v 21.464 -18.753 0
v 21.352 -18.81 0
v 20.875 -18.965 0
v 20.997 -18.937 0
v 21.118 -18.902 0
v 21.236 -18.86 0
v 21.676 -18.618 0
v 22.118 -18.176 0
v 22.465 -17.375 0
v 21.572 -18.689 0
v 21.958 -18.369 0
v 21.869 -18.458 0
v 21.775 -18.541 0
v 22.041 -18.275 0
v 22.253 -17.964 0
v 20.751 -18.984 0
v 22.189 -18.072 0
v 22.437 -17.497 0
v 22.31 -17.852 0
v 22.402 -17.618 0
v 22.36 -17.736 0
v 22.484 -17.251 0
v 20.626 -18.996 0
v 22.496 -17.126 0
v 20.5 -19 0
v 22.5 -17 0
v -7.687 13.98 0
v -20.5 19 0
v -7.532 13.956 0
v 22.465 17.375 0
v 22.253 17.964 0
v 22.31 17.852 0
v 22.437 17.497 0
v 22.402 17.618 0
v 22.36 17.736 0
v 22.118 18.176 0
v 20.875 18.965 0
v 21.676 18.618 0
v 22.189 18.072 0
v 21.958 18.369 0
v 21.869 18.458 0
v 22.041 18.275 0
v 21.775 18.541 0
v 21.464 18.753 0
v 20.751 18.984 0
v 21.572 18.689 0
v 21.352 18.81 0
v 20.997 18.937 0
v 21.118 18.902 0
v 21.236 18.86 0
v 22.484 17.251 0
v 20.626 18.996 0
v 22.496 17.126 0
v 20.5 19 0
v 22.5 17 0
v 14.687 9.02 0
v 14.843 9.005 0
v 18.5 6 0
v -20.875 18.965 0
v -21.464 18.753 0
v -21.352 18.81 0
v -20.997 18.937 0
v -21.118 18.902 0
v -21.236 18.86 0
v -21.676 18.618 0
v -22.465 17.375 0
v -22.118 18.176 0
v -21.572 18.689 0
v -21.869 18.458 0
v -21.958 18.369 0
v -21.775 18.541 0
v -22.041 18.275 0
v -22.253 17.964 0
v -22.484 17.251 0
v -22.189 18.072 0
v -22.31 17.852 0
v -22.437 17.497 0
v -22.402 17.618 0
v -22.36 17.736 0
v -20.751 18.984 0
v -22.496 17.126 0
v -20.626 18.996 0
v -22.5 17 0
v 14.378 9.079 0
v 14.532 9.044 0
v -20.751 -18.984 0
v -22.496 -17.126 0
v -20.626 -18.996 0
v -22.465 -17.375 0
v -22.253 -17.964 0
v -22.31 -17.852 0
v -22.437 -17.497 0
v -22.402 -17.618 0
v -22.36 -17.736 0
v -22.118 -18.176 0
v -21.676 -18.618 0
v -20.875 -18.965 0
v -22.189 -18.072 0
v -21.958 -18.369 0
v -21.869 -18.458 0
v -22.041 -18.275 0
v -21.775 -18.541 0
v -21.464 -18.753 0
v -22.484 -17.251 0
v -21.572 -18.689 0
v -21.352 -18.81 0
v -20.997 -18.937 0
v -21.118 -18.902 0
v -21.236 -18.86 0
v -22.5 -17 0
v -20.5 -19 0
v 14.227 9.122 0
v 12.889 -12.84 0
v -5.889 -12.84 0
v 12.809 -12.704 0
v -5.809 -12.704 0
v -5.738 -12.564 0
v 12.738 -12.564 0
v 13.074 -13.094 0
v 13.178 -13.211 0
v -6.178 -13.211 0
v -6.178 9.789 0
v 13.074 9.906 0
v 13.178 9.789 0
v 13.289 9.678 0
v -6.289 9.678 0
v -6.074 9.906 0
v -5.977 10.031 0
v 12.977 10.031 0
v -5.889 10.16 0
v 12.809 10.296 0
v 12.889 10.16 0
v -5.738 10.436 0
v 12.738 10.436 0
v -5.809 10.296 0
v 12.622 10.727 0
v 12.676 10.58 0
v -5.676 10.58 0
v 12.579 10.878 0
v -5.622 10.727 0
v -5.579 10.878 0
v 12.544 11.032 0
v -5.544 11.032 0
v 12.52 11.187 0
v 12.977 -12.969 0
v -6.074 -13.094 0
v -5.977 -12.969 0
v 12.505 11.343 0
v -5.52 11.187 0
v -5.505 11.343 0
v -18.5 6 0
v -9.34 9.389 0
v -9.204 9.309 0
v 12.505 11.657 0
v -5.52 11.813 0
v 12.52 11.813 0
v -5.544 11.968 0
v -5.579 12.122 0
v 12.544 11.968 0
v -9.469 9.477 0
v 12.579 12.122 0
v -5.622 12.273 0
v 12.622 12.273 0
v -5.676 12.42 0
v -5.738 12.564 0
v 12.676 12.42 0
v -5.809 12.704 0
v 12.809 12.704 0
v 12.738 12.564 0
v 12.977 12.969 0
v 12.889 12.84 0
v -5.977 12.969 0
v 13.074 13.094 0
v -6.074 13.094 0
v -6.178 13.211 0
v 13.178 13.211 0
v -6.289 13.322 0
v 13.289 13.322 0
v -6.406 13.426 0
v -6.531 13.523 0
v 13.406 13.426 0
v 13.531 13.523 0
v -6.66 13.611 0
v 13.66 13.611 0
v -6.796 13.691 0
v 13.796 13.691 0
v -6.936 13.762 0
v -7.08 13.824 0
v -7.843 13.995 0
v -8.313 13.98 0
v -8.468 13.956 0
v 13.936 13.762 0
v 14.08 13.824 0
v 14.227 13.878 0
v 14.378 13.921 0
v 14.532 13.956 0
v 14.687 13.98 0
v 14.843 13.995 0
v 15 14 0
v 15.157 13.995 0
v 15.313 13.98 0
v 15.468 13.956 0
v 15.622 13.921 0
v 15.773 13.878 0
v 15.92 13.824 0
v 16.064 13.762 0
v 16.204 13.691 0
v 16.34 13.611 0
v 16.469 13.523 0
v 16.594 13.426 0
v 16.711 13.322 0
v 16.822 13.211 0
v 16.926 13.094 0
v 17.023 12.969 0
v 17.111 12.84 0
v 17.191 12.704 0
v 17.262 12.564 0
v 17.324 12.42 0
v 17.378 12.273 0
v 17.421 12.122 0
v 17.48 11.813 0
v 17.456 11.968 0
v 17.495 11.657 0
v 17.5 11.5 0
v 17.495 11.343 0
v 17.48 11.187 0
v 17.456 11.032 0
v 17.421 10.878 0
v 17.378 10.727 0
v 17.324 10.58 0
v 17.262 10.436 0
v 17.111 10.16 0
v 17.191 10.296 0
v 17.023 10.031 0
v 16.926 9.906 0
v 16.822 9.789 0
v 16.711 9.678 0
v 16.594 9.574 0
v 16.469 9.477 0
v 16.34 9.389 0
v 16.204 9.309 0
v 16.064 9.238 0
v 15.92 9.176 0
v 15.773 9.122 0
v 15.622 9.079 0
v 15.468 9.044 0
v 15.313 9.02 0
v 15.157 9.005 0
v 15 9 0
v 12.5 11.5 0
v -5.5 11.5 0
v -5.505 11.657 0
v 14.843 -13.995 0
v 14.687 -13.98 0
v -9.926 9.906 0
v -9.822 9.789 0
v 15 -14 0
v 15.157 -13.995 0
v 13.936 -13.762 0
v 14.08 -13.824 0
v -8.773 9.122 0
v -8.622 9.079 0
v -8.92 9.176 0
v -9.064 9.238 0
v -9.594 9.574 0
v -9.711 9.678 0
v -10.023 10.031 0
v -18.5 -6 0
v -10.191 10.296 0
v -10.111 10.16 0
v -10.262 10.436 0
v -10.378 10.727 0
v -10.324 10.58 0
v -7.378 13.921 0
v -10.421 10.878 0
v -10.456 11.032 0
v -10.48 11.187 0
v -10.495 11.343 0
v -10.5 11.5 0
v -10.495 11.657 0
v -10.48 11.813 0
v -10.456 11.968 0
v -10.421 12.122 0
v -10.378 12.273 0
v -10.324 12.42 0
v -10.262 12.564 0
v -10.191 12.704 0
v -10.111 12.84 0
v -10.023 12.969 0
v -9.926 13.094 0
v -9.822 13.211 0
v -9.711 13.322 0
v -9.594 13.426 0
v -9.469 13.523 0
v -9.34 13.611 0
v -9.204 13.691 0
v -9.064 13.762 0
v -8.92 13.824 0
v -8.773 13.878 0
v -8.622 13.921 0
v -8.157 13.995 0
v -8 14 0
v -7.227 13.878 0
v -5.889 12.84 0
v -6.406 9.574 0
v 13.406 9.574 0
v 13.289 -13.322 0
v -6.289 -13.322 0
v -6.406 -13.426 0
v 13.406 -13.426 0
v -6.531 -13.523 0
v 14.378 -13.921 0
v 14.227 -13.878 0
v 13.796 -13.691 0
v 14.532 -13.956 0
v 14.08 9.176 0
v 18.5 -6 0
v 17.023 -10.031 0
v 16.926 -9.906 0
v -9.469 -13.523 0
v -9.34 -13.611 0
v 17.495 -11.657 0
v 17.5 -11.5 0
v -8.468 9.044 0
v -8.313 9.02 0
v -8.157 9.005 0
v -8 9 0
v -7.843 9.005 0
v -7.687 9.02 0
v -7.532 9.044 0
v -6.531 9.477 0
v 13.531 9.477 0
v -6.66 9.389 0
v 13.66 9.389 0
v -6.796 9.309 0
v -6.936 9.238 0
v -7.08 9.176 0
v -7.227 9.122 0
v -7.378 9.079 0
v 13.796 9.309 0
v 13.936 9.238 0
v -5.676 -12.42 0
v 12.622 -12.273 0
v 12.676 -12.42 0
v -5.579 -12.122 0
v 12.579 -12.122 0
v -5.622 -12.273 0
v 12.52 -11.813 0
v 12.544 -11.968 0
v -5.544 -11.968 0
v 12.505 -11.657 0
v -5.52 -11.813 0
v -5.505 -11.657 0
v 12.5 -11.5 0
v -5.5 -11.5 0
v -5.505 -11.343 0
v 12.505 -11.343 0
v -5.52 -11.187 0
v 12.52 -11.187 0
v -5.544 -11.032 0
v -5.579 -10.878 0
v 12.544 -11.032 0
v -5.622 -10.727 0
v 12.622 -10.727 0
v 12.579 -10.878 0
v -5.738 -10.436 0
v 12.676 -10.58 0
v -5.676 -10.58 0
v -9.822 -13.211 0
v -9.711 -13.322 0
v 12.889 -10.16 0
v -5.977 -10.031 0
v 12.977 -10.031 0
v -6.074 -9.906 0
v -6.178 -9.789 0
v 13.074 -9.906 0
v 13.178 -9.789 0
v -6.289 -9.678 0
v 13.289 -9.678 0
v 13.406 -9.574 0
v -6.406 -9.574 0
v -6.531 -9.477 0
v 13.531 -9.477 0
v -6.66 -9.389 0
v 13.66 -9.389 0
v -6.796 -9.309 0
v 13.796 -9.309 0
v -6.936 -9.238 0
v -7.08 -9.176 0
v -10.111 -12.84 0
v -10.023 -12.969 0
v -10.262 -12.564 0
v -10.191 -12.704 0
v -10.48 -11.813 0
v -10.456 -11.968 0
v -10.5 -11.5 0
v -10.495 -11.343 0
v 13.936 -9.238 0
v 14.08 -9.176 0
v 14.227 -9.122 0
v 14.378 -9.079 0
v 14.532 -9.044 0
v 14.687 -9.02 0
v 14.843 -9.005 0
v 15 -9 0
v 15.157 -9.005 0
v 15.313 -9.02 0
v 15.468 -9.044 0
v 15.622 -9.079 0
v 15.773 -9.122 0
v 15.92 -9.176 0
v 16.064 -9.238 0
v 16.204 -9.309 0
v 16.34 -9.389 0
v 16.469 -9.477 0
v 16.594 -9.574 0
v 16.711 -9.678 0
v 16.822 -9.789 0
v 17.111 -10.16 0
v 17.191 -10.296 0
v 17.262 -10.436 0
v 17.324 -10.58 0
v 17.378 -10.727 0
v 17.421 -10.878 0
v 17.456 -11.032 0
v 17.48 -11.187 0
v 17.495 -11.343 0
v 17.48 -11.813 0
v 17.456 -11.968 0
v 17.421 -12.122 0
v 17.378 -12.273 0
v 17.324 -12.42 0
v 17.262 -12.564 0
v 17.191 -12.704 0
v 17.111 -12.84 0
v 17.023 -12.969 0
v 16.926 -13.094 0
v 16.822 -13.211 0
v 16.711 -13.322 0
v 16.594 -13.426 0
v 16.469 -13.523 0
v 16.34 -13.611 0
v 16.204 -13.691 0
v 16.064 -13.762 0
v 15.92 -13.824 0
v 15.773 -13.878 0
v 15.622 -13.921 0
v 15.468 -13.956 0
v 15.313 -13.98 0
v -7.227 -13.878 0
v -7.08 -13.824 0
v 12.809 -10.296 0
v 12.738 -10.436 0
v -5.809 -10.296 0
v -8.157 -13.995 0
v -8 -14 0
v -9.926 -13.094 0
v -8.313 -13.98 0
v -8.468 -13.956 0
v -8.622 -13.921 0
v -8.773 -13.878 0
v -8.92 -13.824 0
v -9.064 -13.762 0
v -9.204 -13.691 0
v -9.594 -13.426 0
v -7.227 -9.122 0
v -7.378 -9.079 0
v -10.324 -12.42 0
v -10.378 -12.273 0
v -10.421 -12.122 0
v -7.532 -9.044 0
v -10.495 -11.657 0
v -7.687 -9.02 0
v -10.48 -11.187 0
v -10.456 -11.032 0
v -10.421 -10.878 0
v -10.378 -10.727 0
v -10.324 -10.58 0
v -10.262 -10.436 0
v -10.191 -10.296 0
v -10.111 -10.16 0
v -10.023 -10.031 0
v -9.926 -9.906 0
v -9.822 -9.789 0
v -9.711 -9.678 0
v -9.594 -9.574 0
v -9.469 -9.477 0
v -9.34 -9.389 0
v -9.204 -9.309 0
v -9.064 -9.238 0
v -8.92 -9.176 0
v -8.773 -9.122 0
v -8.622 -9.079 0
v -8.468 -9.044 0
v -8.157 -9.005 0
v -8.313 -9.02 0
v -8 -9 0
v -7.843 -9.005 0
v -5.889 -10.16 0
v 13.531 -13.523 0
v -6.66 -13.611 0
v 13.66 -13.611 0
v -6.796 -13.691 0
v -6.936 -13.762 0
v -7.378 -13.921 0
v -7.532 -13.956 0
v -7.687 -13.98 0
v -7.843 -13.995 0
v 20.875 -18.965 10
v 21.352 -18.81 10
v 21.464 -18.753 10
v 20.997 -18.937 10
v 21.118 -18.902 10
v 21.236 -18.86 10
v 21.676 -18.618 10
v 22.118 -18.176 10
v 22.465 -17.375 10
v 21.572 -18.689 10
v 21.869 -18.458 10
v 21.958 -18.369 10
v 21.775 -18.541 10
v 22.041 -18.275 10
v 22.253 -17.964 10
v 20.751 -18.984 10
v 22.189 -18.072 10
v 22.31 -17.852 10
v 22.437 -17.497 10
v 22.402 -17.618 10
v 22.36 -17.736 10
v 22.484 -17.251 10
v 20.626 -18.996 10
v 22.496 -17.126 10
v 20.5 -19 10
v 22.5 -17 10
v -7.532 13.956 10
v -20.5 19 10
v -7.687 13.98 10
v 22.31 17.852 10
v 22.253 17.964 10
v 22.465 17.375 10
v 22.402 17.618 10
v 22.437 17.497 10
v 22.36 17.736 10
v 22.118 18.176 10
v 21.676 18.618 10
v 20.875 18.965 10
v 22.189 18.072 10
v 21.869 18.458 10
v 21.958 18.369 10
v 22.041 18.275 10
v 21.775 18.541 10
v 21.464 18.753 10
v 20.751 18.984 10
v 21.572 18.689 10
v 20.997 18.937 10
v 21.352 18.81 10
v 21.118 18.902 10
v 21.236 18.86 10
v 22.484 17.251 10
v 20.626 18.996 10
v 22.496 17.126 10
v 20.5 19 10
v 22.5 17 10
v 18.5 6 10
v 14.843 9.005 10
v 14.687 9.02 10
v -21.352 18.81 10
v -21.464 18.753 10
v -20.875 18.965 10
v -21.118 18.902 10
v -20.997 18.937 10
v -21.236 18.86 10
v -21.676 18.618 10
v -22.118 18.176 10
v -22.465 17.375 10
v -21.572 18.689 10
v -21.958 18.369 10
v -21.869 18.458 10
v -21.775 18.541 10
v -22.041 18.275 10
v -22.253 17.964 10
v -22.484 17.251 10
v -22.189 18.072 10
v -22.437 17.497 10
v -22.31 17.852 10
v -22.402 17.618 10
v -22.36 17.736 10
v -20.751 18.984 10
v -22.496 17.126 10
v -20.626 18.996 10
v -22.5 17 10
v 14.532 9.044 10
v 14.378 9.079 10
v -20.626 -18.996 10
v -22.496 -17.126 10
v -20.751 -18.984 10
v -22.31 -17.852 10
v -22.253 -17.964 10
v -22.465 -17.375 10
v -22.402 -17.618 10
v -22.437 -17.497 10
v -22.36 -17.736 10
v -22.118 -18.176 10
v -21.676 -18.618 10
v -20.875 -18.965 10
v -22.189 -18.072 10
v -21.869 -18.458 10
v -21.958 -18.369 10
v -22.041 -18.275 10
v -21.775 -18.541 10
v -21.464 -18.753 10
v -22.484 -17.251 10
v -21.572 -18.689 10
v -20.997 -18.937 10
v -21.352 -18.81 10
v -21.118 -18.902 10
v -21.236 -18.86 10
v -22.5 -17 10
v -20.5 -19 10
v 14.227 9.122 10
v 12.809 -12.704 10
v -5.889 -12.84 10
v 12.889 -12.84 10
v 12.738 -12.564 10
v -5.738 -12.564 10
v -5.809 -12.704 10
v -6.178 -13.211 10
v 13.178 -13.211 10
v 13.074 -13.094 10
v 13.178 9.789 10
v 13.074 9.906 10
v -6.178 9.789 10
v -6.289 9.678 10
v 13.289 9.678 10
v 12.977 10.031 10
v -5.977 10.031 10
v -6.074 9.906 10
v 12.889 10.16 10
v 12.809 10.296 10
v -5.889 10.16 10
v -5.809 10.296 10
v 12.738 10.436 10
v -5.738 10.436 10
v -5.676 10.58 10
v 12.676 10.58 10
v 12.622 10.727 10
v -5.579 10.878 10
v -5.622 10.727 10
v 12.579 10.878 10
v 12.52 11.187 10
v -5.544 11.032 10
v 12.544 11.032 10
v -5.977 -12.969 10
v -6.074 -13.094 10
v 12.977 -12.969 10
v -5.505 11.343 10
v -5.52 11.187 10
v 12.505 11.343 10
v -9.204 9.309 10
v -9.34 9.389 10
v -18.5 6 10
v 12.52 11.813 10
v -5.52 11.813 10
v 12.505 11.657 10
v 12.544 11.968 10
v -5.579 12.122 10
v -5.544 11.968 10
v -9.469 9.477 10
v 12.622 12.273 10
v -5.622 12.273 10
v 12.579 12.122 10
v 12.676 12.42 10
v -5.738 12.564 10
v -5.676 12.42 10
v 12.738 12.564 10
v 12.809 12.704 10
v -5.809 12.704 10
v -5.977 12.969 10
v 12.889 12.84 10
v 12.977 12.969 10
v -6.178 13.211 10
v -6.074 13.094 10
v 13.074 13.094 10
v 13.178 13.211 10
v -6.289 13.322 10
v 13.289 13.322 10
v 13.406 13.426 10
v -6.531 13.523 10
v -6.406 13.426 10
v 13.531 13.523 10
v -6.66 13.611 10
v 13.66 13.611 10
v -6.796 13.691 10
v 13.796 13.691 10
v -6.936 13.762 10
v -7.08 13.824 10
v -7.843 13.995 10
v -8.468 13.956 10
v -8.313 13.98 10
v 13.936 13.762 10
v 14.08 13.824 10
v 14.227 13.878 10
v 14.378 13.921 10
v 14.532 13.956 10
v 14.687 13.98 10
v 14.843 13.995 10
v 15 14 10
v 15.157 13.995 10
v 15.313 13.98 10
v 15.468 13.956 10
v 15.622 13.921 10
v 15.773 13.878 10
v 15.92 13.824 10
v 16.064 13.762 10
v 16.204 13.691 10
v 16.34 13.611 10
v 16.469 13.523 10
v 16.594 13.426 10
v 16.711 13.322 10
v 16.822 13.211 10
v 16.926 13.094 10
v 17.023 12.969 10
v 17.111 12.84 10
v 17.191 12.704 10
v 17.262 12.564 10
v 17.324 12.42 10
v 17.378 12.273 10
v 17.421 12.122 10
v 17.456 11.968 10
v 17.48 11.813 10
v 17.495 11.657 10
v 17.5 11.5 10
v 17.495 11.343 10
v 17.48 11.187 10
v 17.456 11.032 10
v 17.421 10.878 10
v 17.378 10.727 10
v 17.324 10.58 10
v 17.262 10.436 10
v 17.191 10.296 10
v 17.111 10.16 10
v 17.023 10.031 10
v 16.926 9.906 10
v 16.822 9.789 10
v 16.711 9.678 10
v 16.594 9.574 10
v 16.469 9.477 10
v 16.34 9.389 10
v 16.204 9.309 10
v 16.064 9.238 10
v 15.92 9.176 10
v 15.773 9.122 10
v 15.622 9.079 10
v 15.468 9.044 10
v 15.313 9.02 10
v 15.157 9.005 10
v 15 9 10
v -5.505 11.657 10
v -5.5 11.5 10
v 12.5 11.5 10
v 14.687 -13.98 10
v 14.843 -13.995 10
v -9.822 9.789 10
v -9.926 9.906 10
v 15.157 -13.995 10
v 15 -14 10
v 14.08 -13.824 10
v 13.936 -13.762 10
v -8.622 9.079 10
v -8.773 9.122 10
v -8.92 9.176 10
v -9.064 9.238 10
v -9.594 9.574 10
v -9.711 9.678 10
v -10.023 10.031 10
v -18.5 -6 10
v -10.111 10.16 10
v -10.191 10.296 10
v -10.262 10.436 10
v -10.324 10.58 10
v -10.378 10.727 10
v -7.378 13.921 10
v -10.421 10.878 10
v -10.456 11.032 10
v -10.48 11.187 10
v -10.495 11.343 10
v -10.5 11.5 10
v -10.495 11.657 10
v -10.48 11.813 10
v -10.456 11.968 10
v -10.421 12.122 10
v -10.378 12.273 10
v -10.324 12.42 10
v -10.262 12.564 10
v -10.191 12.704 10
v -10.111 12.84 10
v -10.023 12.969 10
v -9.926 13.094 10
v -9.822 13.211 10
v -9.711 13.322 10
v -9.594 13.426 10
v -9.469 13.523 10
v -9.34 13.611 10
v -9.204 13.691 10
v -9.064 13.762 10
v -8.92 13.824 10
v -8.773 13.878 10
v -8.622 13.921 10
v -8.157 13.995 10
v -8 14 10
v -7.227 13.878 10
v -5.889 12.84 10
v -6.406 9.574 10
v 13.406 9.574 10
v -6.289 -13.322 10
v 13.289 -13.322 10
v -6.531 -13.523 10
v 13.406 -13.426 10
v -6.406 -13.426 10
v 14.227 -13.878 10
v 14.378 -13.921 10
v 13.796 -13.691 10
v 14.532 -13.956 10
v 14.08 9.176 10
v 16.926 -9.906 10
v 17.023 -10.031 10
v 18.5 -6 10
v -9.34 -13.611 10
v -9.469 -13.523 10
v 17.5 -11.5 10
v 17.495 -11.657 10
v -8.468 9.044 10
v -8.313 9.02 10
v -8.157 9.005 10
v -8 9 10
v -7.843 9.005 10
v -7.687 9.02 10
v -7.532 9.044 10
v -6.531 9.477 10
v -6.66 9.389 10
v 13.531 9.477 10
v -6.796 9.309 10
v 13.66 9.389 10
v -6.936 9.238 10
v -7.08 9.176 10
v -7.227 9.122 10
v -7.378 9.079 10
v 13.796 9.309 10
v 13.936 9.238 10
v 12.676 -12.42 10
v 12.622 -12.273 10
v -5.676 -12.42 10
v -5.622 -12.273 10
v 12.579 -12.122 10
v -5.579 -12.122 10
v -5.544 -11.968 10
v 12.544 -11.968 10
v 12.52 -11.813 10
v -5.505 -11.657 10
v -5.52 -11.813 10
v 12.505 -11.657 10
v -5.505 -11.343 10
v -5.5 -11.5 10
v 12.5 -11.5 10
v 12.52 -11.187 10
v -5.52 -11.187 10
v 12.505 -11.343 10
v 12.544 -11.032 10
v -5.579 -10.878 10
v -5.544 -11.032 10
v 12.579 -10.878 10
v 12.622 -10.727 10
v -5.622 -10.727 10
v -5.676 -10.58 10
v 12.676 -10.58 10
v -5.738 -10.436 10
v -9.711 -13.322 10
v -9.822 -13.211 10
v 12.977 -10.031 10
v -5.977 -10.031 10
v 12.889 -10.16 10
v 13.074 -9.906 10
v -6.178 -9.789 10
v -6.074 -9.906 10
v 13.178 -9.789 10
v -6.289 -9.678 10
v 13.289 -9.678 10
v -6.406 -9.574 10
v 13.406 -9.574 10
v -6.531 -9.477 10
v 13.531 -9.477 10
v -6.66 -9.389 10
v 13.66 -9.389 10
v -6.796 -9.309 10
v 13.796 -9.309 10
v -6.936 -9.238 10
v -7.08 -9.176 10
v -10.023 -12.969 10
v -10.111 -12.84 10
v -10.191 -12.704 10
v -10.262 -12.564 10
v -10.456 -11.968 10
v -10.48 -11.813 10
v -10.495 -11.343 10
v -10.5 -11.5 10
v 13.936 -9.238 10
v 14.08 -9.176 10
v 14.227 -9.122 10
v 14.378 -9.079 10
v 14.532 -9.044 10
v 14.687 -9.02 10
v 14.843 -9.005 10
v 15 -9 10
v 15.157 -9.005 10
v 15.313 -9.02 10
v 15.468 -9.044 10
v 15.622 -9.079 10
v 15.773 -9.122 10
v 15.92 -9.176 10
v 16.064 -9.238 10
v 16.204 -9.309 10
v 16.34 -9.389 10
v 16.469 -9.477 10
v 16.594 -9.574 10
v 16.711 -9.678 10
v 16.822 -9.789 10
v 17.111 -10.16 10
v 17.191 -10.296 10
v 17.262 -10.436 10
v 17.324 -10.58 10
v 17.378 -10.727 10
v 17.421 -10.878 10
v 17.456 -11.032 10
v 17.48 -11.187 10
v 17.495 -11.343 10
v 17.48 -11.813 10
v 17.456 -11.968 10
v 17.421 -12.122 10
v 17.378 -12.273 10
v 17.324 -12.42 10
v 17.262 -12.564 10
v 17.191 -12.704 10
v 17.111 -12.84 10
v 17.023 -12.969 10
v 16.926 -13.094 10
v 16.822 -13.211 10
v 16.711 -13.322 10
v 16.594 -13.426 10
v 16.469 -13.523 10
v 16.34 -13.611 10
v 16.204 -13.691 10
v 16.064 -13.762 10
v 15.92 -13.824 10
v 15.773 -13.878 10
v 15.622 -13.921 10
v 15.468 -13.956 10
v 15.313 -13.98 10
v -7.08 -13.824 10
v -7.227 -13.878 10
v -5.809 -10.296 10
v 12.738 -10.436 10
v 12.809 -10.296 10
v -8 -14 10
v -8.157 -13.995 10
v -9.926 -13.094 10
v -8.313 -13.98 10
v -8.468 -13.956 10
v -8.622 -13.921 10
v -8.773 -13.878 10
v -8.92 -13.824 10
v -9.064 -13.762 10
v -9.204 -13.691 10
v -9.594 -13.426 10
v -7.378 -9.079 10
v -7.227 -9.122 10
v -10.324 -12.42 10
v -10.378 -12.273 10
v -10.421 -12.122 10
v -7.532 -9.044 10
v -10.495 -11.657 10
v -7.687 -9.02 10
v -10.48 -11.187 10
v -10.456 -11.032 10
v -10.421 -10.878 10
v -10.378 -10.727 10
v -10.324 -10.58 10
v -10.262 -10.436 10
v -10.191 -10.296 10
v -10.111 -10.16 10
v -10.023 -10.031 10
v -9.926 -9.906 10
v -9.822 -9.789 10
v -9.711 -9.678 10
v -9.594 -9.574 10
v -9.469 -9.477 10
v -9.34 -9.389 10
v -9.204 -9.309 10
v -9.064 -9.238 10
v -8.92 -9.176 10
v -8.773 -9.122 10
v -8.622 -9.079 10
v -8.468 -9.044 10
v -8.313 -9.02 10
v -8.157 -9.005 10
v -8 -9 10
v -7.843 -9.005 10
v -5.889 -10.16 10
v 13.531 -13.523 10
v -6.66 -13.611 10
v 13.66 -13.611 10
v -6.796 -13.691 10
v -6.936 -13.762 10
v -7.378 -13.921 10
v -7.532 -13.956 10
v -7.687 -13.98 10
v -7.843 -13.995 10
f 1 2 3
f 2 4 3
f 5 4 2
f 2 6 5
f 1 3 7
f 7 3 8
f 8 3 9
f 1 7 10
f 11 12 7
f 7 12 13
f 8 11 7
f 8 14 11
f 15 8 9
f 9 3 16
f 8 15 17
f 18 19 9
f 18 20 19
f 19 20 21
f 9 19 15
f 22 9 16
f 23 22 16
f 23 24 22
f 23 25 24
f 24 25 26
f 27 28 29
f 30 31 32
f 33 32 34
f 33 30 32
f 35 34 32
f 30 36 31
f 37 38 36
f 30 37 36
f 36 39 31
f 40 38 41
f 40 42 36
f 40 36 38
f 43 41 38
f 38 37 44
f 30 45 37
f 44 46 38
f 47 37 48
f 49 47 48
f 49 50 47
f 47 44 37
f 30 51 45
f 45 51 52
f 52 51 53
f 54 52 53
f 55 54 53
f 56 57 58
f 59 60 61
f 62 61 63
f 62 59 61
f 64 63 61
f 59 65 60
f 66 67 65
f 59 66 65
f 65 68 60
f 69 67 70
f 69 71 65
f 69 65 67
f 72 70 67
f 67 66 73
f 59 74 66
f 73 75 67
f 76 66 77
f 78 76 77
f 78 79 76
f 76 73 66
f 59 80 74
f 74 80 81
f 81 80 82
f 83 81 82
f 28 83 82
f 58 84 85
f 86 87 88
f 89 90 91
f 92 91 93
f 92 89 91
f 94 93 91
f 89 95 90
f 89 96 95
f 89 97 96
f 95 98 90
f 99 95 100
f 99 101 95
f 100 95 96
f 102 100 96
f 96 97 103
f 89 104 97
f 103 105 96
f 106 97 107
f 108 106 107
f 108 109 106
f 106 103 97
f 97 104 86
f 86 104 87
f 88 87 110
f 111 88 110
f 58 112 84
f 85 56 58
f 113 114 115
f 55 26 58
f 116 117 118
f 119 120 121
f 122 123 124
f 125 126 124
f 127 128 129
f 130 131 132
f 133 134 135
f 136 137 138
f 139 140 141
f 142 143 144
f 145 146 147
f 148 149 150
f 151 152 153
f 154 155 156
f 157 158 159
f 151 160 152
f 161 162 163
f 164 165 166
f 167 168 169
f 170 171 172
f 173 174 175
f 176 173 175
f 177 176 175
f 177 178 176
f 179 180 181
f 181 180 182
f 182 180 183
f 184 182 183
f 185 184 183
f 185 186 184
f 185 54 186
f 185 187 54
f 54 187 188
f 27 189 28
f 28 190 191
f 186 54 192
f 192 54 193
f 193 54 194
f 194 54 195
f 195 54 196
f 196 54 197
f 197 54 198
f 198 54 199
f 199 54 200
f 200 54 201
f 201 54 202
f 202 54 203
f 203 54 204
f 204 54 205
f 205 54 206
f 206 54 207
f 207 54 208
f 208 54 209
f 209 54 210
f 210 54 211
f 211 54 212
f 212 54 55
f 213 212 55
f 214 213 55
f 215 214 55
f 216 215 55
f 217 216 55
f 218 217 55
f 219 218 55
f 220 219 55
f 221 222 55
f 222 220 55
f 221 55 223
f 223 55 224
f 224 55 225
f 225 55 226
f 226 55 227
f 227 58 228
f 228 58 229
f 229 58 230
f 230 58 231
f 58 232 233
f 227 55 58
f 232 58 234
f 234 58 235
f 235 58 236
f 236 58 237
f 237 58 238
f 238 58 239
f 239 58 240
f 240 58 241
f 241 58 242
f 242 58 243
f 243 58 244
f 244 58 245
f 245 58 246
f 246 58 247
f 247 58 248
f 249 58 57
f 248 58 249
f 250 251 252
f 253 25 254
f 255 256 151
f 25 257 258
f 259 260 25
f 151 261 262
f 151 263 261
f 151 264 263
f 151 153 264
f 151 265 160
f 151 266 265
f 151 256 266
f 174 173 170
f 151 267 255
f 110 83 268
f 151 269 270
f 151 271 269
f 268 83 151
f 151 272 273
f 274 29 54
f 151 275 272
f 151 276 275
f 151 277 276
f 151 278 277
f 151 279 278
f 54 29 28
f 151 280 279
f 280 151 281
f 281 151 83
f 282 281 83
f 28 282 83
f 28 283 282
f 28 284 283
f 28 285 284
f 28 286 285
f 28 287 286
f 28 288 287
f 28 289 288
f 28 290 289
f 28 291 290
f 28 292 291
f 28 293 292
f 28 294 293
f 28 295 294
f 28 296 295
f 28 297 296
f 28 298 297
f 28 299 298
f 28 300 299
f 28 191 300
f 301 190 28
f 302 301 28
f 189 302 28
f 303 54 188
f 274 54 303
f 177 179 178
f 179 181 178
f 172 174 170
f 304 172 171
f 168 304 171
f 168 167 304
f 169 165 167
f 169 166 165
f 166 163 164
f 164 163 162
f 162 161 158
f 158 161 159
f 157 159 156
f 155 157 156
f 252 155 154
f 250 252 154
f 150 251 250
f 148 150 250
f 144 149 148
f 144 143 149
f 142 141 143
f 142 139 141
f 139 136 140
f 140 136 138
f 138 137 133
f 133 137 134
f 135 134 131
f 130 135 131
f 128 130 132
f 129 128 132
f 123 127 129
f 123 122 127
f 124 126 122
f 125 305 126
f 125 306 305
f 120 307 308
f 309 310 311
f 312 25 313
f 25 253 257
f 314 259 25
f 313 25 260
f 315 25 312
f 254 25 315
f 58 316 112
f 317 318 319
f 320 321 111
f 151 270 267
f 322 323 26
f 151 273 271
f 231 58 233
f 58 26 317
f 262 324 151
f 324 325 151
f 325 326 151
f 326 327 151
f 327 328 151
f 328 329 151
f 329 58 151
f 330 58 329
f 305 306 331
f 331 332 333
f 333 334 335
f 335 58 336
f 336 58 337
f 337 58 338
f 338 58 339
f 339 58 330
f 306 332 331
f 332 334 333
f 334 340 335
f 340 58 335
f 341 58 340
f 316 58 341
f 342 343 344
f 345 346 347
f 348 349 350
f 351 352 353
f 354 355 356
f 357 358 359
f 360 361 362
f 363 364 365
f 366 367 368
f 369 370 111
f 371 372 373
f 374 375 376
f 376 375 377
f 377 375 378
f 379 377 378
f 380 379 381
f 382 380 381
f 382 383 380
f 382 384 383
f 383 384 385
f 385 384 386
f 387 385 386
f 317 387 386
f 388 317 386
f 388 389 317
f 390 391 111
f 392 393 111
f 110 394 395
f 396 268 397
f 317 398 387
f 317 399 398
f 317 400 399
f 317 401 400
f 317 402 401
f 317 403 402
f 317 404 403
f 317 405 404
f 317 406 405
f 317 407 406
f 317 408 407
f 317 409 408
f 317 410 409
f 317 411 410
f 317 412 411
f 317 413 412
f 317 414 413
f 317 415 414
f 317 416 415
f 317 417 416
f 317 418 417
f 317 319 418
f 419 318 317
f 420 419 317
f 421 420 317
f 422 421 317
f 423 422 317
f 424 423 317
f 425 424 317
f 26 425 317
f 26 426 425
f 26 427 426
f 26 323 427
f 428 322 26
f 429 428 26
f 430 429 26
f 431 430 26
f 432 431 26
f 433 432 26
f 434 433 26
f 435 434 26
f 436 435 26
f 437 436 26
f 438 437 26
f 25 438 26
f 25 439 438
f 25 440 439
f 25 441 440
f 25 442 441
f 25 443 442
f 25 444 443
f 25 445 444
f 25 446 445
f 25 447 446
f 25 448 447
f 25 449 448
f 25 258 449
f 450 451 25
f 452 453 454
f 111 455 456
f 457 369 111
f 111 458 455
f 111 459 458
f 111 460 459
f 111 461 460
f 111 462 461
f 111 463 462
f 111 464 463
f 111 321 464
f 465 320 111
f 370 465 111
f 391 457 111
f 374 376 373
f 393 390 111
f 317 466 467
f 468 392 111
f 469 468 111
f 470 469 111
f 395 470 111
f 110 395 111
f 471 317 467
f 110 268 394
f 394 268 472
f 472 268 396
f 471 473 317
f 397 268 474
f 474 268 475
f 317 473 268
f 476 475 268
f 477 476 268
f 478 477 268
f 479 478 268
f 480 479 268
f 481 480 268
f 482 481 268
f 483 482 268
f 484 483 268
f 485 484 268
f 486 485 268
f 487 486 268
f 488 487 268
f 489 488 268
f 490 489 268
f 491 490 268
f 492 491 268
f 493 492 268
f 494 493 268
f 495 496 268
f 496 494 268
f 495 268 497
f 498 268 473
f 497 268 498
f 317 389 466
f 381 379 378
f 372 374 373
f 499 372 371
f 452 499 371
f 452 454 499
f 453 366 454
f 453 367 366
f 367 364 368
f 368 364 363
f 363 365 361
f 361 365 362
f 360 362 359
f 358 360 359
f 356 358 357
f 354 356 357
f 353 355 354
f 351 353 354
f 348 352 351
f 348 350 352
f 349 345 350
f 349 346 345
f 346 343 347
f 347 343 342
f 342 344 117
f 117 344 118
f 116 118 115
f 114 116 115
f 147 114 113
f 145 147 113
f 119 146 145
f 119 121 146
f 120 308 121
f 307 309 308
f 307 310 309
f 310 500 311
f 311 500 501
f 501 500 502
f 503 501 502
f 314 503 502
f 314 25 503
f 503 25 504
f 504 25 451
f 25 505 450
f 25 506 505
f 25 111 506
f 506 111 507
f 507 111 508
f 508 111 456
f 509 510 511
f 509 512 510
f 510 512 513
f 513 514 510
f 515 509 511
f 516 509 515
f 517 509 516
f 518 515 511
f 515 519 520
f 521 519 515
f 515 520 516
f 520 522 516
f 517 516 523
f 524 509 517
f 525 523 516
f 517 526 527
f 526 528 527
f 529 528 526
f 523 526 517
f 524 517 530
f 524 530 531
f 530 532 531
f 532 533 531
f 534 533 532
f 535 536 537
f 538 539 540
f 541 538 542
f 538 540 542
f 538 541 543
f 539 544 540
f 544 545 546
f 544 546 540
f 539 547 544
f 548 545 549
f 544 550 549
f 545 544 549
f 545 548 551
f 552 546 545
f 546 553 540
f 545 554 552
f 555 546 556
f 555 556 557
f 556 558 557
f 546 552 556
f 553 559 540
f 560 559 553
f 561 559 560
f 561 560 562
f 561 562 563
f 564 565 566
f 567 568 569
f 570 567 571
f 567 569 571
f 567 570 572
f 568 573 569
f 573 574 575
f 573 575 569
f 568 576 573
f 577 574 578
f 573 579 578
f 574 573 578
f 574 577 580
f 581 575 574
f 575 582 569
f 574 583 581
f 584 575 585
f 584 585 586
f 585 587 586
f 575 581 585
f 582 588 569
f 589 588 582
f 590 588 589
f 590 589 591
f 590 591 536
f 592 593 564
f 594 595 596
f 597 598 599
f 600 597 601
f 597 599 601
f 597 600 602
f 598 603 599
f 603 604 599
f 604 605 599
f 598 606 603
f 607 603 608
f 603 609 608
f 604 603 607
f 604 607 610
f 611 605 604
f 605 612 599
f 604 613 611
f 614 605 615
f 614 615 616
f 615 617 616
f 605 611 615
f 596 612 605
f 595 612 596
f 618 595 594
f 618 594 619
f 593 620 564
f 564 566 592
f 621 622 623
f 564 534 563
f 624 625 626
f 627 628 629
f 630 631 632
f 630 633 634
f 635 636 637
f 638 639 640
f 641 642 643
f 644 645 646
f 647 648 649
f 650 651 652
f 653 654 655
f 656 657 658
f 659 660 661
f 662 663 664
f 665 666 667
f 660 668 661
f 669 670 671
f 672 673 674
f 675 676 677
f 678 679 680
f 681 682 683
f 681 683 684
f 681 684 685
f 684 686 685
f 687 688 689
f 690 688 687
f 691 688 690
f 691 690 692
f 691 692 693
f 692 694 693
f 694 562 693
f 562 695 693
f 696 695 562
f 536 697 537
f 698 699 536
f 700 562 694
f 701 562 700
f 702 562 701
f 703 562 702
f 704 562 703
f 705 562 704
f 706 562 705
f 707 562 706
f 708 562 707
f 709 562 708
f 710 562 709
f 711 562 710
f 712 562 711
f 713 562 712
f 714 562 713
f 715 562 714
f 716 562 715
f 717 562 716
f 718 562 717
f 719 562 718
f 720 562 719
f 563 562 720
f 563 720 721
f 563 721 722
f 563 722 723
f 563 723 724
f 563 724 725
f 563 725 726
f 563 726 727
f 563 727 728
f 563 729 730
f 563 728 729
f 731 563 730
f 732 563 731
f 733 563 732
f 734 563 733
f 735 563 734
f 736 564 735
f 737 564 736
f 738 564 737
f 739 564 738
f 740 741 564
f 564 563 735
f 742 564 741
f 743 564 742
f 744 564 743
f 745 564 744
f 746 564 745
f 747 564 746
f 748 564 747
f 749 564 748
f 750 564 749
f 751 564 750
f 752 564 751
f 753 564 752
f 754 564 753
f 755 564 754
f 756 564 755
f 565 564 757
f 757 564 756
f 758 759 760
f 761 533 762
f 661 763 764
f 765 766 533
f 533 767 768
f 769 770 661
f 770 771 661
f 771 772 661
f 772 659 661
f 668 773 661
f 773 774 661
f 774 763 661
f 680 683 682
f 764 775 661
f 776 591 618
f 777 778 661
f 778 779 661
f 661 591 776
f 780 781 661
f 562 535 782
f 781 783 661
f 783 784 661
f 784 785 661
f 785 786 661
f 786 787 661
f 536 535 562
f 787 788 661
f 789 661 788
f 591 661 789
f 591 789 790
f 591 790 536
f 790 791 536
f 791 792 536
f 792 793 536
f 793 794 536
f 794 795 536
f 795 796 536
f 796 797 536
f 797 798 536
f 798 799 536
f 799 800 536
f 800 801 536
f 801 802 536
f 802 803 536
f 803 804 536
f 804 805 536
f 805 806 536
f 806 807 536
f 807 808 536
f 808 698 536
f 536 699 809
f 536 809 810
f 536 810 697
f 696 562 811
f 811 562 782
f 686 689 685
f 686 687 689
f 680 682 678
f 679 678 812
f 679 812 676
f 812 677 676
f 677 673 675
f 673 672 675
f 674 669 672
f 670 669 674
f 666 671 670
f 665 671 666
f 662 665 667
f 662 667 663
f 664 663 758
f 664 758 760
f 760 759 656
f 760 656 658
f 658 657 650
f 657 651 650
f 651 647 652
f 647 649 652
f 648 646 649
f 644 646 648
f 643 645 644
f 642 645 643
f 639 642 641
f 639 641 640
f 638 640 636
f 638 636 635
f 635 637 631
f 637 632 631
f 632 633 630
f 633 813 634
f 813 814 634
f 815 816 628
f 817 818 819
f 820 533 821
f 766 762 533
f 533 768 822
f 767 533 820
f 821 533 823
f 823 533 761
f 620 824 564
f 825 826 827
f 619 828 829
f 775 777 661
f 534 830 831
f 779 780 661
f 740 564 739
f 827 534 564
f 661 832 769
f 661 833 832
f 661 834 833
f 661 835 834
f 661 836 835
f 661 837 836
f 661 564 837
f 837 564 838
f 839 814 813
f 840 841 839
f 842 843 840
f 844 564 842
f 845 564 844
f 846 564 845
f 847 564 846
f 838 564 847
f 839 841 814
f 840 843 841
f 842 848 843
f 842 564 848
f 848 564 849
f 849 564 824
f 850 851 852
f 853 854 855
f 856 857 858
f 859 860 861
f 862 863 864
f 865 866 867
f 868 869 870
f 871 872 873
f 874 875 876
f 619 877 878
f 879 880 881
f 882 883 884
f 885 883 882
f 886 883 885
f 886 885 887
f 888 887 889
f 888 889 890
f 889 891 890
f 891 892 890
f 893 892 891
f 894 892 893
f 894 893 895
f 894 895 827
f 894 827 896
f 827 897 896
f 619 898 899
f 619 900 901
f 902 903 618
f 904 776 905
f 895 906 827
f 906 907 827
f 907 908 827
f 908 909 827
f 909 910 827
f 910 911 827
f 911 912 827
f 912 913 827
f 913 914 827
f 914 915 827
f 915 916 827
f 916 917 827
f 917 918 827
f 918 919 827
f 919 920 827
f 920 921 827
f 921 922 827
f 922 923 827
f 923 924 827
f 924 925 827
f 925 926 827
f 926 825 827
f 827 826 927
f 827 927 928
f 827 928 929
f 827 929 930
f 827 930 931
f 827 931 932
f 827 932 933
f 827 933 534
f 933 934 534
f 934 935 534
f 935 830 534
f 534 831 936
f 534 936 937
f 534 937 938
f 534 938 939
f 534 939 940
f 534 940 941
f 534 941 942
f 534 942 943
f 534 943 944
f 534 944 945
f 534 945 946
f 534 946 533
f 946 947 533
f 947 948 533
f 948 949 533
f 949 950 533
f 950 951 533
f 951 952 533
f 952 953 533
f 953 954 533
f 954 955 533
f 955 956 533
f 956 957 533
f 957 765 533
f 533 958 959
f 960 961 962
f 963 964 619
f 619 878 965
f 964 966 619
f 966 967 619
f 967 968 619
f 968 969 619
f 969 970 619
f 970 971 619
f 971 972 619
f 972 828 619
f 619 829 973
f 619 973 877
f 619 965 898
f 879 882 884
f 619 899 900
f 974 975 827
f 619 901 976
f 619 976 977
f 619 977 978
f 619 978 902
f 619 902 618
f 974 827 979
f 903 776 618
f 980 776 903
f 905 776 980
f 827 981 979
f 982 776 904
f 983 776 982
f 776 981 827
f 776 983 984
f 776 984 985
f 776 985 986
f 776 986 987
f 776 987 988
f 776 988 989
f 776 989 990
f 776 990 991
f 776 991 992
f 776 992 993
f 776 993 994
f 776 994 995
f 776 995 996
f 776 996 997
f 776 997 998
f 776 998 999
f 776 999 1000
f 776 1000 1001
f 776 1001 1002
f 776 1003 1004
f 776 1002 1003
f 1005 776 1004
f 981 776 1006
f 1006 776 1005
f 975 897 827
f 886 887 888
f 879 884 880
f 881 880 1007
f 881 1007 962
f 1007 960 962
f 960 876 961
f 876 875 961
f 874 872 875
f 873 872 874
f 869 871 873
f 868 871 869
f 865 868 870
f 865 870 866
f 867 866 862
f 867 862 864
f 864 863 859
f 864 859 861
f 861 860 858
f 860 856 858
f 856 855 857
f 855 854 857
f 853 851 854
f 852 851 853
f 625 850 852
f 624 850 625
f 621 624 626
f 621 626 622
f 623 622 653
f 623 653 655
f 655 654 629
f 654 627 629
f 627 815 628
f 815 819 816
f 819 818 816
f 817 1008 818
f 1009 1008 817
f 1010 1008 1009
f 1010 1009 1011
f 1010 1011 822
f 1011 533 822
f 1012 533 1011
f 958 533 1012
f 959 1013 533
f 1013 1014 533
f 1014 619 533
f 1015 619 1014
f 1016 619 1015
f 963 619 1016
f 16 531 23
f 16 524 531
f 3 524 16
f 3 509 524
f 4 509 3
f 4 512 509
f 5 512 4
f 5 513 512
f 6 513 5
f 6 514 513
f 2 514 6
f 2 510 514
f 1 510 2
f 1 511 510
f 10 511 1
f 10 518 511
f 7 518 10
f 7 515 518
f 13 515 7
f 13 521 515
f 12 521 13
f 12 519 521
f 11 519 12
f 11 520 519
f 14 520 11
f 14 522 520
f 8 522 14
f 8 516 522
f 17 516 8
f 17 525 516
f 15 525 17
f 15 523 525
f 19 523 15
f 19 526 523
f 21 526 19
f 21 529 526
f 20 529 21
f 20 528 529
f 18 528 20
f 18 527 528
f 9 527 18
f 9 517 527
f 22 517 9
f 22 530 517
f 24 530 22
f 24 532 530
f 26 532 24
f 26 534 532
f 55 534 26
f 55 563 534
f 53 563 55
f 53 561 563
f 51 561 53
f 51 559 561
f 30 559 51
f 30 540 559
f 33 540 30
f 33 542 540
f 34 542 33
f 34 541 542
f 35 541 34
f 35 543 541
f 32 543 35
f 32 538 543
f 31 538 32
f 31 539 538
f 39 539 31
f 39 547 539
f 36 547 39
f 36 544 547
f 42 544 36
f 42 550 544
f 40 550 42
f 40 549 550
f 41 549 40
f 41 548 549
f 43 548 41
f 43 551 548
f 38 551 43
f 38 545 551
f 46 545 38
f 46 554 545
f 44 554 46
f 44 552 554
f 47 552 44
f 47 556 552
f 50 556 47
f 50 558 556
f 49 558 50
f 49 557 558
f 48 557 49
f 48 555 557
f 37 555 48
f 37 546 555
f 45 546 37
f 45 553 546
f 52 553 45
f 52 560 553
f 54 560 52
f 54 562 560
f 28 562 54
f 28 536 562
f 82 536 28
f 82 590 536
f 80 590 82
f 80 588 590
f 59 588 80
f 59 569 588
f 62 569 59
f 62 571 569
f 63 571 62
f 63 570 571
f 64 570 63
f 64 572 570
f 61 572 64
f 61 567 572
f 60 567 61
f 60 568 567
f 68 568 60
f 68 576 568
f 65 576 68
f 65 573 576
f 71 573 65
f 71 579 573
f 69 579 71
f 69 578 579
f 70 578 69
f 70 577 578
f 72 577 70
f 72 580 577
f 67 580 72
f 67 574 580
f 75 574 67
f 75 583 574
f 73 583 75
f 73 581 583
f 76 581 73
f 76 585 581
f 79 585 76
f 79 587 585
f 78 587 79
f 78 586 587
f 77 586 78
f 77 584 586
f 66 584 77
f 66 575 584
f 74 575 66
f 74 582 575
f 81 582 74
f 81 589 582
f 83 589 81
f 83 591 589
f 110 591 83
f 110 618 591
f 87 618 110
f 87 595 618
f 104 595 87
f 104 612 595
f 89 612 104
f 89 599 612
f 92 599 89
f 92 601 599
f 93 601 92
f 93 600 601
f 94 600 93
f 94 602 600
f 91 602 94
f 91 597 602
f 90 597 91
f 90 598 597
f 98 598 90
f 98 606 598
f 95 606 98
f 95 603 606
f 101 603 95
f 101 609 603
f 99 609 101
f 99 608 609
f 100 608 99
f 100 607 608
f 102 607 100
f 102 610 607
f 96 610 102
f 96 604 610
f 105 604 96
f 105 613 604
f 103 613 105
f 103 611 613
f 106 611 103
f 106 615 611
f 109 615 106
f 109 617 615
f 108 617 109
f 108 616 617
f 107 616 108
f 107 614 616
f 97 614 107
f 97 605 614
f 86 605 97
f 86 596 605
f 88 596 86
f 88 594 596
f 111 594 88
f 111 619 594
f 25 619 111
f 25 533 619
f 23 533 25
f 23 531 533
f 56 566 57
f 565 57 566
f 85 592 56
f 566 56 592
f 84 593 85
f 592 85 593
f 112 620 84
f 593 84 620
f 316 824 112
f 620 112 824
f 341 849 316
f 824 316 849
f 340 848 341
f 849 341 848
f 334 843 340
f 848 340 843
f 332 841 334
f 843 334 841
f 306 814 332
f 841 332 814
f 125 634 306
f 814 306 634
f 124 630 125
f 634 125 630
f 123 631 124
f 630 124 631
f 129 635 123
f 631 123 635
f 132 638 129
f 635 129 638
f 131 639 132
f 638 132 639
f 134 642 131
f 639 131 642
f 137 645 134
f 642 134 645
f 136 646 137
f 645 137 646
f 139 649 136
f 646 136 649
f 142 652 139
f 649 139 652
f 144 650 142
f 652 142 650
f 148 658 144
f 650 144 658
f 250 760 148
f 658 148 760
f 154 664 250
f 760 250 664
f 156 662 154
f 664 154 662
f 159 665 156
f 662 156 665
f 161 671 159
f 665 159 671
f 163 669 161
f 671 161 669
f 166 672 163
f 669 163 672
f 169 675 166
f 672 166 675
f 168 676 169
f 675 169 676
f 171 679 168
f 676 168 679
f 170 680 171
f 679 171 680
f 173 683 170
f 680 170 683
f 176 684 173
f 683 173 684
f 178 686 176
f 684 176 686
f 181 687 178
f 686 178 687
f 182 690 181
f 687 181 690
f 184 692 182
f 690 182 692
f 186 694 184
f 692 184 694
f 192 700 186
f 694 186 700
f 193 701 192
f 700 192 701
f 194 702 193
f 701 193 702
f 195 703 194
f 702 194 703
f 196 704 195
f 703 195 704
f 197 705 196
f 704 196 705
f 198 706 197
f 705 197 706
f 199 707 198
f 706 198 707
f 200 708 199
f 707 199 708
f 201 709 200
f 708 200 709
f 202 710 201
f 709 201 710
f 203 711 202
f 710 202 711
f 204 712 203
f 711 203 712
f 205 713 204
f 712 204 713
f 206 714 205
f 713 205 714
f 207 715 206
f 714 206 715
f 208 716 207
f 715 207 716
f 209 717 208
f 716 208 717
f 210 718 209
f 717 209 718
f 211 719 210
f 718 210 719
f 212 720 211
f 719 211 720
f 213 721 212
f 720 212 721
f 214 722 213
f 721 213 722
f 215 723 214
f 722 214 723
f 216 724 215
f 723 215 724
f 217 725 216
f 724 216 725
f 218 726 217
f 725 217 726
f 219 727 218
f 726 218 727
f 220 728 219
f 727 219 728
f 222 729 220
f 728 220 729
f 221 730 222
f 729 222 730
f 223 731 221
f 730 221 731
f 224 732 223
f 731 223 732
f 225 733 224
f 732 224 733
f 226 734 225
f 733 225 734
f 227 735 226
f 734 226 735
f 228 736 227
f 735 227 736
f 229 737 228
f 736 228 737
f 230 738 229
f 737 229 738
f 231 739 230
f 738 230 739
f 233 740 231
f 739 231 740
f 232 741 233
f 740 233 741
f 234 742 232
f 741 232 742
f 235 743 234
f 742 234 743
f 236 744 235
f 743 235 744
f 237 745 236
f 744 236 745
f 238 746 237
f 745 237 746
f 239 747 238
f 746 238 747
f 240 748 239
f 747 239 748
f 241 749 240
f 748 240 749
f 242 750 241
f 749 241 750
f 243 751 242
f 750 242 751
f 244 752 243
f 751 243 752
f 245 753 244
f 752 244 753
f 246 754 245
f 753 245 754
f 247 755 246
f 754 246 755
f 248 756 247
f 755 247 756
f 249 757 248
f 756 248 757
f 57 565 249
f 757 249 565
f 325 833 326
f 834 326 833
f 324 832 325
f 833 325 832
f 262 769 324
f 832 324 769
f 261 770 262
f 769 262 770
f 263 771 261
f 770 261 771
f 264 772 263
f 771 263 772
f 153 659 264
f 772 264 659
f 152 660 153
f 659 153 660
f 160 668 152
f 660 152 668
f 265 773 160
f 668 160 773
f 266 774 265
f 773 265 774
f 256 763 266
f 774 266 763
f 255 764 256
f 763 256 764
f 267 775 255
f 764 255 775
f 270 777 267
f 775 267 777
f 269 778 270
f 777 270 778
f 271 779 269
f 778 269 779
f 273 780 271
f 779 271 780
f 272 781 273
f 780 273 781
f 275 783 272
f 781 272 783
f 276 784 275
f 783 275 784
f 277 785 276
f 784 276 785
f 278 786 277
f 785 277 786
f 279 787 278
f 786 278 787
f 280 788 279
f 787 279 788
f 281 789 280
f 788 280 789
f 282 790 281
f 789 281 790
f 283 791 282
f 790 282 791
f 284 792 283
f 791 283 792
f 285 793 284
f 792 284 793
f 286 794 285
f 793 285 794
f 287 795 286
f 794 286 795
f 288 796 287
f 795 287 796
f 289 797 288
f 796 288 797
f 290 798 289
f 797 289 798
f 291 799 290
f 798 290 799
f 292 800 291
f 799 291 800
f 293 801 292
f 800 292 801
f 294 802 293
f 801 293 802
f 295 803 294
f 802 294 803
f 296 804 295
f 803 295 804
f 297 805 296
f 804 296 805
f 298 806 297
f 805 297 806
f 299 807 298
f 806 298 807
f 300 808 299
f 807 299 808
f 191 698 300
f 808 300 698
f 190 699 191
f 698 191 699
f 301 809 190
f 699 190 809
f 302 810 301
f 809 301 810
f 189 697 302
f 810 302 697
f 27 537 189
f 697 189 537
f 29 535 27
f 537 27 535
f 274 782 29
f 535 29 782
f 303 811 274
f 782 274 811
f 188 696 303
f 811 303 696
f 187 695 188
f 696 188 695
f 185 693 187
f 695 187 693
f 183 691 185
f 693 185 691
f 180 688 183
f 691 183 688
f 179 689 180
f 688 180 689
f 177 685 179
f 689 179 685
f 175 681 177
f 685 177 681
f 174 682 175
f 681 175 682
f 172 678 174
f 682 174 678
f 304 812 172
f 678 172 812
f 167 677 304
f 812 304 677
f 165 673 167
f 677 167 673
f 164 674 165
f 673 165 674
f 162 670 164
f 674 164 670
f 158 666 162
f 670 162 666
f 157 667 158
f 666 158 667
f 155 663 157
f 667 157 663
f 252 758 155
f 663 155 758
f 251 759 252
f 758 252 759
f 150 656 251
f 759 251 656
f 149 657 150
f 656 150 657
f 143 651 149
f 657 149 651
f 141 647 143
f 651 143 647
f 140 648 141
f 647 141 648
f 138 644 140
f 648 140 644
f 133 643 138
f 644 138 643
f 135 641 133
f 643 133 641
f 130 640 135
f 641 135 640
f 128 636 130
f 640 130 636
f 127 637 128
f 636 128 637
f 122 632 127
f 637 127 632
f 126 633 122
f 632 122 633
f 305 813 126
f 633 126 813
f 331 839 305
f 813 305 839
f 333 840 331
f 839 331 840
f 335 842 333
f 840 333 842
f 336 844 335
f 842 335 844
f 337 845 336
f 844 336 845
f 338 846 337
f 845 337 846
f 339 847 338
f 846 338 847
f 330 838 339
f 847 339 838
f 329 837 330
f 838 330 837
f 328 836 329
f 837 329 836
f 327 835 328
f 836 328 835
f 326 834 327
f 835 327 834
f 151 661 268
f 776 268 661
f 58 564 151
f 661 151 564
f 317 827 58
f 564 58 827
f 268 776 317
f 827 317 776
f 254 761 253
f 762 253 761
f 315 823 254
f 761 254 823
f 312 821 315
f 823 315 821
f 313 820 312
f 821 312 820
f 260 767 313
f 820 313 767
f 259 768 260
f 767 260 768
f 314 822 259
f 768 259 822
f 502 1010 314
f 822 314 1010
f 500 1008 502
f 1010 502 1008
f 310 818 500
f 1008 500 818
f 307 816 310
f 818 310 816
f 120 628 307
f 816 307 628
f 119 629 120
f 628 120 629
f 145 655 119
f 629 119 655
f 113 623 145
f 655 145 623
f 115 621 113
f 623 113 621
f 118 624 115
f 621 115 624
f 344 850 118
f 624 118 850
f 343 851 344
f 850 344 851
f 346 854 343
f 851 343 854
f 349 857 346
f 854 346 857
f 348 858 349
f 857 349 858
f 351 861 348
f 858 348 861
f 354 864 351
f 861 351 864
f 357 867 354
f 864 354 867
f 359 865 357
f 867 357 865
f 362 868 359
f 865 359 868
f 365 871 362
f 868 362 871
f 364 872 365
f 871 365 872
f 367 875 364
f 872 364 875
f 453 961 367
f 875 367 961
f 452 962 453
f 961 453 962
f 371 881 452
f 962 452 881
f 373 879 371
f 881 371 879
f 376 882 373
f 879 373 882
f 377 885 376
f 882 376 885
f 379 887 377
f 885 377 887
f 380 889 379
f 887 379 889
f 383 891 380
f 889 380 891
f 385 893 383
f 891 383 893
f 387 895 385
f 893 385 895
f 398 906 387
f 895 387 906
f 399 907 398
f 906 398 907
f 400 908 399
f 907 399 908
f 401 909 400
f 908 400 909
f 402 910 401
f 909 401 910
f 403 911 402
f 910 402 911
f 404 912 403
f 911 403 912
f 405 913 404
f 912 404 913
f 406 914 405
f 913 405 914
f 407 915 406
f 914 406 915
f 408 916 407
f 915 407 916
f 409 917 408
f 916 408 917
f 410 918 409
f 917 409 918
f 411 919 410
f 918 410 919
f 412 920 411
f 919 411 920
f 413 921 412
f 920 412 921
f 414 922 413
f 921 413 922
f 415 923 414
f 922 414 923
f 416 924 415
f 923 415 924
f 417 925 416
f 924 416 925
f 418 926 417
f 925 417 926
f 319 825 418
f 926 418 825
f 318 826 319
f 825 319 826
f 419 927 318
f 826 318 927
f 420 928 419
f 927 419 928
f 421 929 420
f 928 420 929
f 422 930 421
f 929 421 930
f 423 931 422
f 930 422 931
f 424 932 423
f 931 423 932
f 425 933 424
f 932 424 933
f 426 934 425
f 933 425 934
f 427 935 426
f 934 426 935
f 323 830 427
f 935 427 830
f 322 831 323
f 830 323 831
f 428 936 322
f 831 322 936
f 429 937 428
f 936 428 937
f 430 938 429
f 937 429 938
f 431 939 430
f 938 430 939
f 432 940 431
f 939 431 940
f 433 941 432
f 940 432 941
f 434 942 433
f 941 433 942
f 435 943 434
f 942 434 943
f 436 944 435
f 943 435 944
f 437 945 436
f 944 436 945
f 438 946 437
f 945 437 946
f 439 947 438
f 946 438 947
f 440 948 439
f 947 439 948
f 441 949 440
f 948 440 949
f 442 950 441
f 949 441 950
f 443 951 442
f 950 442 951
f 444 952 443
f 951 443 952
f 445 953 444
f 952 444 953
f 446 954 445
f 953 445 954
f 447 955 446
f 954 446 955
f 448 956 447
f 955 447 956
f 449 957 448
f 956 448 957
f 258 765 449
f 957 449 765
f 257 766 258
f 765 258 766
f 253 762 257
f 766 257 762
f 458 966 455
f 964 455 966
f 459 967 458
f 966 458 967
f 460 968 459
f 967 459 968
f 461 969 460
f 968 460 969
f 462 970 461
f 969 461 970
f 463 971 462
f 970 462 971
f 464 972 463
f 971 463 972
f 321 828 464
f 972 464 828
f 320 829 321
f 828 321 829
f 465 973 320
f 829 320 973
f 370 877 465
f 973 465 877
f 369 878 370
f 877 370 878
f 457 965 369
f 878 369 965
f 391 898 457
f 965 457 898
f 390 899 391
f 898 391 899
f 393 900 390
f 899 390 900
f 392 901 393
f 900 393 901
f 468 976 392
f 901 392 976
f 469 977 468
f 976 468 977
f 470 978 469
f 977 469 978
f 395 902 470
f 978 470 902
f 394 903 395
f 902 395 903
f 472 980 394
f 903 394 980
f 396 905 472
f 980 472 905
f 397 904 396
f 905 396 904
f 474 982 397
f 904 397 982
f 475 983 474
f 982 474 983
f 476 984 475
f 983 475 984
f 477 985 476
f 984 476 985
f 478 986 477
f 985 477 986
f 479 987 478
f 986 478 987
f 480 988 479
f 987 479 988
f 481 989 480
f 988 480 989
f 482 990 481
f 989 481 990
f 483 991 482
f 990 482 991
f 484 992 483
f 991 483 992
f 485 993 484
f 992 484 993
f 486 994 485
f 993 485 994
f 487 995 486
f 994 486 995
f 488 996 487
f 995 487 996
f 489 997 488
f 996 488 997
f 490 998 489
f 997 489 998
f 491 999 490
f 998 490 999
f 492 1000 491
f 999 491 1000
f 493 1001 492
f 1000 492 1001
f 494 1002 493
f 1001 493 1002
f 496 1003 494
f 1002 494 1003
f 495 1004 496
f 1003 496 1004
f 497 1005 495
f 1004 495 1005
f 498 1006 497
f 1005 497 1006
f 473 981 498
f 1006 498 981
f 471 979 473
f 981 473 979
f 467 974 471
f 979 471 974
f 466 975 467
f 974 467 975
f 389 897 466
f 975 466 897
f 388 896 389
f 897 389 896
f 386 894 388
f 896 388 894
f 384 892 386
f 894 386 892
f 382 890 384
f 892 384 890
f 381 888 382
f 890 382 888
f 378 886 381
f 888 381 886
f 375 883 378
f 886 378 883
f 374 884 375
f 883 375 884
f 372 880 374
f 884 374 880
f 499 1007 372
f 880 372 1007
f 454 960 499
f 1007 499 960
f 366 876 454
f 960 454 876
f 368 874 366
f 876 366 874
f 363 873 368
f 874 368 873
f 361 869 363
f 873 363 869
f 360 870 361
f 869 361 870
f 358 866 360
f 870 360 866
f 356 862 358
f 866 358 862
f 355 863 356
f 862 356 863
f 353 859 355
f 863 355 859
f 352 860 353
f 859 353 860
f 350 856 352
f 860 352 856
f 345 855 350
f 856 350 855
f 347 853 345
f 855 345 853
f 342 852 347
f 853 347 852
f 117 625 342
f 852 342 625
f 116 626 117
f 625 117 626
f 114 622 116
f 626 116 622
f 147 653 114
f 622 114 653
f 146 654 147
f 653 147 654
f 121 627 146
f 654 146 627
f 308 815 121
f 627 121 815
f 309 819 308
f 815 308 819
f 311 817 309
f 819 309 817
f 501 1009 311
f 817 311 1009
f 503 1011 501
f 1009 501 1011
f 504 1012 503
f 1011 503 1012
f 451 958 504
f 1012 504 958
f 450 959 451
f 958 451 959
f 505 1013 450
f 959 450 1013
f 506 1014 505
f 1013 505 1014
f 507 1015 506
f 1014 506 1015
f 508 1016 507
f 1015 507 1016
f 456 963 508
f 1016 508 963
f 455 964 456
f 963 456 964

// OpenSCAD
$fn = 100;

linear_extrude (10) difference() {
    offset (2) square ([41,34], true);
    square ([37,12], true);
    translate ([15,(38/2)-7.5]) circle (d=5);
    translate ([15,-(38/2)+7.5]) circle (d=5);
    translate ([-(45/2)+14.5,(38/2)-7.5]) circle (d=5);
    translate ([-(45/2)+14.5,-(38/2)+7.5]) circle (d=5);
}
